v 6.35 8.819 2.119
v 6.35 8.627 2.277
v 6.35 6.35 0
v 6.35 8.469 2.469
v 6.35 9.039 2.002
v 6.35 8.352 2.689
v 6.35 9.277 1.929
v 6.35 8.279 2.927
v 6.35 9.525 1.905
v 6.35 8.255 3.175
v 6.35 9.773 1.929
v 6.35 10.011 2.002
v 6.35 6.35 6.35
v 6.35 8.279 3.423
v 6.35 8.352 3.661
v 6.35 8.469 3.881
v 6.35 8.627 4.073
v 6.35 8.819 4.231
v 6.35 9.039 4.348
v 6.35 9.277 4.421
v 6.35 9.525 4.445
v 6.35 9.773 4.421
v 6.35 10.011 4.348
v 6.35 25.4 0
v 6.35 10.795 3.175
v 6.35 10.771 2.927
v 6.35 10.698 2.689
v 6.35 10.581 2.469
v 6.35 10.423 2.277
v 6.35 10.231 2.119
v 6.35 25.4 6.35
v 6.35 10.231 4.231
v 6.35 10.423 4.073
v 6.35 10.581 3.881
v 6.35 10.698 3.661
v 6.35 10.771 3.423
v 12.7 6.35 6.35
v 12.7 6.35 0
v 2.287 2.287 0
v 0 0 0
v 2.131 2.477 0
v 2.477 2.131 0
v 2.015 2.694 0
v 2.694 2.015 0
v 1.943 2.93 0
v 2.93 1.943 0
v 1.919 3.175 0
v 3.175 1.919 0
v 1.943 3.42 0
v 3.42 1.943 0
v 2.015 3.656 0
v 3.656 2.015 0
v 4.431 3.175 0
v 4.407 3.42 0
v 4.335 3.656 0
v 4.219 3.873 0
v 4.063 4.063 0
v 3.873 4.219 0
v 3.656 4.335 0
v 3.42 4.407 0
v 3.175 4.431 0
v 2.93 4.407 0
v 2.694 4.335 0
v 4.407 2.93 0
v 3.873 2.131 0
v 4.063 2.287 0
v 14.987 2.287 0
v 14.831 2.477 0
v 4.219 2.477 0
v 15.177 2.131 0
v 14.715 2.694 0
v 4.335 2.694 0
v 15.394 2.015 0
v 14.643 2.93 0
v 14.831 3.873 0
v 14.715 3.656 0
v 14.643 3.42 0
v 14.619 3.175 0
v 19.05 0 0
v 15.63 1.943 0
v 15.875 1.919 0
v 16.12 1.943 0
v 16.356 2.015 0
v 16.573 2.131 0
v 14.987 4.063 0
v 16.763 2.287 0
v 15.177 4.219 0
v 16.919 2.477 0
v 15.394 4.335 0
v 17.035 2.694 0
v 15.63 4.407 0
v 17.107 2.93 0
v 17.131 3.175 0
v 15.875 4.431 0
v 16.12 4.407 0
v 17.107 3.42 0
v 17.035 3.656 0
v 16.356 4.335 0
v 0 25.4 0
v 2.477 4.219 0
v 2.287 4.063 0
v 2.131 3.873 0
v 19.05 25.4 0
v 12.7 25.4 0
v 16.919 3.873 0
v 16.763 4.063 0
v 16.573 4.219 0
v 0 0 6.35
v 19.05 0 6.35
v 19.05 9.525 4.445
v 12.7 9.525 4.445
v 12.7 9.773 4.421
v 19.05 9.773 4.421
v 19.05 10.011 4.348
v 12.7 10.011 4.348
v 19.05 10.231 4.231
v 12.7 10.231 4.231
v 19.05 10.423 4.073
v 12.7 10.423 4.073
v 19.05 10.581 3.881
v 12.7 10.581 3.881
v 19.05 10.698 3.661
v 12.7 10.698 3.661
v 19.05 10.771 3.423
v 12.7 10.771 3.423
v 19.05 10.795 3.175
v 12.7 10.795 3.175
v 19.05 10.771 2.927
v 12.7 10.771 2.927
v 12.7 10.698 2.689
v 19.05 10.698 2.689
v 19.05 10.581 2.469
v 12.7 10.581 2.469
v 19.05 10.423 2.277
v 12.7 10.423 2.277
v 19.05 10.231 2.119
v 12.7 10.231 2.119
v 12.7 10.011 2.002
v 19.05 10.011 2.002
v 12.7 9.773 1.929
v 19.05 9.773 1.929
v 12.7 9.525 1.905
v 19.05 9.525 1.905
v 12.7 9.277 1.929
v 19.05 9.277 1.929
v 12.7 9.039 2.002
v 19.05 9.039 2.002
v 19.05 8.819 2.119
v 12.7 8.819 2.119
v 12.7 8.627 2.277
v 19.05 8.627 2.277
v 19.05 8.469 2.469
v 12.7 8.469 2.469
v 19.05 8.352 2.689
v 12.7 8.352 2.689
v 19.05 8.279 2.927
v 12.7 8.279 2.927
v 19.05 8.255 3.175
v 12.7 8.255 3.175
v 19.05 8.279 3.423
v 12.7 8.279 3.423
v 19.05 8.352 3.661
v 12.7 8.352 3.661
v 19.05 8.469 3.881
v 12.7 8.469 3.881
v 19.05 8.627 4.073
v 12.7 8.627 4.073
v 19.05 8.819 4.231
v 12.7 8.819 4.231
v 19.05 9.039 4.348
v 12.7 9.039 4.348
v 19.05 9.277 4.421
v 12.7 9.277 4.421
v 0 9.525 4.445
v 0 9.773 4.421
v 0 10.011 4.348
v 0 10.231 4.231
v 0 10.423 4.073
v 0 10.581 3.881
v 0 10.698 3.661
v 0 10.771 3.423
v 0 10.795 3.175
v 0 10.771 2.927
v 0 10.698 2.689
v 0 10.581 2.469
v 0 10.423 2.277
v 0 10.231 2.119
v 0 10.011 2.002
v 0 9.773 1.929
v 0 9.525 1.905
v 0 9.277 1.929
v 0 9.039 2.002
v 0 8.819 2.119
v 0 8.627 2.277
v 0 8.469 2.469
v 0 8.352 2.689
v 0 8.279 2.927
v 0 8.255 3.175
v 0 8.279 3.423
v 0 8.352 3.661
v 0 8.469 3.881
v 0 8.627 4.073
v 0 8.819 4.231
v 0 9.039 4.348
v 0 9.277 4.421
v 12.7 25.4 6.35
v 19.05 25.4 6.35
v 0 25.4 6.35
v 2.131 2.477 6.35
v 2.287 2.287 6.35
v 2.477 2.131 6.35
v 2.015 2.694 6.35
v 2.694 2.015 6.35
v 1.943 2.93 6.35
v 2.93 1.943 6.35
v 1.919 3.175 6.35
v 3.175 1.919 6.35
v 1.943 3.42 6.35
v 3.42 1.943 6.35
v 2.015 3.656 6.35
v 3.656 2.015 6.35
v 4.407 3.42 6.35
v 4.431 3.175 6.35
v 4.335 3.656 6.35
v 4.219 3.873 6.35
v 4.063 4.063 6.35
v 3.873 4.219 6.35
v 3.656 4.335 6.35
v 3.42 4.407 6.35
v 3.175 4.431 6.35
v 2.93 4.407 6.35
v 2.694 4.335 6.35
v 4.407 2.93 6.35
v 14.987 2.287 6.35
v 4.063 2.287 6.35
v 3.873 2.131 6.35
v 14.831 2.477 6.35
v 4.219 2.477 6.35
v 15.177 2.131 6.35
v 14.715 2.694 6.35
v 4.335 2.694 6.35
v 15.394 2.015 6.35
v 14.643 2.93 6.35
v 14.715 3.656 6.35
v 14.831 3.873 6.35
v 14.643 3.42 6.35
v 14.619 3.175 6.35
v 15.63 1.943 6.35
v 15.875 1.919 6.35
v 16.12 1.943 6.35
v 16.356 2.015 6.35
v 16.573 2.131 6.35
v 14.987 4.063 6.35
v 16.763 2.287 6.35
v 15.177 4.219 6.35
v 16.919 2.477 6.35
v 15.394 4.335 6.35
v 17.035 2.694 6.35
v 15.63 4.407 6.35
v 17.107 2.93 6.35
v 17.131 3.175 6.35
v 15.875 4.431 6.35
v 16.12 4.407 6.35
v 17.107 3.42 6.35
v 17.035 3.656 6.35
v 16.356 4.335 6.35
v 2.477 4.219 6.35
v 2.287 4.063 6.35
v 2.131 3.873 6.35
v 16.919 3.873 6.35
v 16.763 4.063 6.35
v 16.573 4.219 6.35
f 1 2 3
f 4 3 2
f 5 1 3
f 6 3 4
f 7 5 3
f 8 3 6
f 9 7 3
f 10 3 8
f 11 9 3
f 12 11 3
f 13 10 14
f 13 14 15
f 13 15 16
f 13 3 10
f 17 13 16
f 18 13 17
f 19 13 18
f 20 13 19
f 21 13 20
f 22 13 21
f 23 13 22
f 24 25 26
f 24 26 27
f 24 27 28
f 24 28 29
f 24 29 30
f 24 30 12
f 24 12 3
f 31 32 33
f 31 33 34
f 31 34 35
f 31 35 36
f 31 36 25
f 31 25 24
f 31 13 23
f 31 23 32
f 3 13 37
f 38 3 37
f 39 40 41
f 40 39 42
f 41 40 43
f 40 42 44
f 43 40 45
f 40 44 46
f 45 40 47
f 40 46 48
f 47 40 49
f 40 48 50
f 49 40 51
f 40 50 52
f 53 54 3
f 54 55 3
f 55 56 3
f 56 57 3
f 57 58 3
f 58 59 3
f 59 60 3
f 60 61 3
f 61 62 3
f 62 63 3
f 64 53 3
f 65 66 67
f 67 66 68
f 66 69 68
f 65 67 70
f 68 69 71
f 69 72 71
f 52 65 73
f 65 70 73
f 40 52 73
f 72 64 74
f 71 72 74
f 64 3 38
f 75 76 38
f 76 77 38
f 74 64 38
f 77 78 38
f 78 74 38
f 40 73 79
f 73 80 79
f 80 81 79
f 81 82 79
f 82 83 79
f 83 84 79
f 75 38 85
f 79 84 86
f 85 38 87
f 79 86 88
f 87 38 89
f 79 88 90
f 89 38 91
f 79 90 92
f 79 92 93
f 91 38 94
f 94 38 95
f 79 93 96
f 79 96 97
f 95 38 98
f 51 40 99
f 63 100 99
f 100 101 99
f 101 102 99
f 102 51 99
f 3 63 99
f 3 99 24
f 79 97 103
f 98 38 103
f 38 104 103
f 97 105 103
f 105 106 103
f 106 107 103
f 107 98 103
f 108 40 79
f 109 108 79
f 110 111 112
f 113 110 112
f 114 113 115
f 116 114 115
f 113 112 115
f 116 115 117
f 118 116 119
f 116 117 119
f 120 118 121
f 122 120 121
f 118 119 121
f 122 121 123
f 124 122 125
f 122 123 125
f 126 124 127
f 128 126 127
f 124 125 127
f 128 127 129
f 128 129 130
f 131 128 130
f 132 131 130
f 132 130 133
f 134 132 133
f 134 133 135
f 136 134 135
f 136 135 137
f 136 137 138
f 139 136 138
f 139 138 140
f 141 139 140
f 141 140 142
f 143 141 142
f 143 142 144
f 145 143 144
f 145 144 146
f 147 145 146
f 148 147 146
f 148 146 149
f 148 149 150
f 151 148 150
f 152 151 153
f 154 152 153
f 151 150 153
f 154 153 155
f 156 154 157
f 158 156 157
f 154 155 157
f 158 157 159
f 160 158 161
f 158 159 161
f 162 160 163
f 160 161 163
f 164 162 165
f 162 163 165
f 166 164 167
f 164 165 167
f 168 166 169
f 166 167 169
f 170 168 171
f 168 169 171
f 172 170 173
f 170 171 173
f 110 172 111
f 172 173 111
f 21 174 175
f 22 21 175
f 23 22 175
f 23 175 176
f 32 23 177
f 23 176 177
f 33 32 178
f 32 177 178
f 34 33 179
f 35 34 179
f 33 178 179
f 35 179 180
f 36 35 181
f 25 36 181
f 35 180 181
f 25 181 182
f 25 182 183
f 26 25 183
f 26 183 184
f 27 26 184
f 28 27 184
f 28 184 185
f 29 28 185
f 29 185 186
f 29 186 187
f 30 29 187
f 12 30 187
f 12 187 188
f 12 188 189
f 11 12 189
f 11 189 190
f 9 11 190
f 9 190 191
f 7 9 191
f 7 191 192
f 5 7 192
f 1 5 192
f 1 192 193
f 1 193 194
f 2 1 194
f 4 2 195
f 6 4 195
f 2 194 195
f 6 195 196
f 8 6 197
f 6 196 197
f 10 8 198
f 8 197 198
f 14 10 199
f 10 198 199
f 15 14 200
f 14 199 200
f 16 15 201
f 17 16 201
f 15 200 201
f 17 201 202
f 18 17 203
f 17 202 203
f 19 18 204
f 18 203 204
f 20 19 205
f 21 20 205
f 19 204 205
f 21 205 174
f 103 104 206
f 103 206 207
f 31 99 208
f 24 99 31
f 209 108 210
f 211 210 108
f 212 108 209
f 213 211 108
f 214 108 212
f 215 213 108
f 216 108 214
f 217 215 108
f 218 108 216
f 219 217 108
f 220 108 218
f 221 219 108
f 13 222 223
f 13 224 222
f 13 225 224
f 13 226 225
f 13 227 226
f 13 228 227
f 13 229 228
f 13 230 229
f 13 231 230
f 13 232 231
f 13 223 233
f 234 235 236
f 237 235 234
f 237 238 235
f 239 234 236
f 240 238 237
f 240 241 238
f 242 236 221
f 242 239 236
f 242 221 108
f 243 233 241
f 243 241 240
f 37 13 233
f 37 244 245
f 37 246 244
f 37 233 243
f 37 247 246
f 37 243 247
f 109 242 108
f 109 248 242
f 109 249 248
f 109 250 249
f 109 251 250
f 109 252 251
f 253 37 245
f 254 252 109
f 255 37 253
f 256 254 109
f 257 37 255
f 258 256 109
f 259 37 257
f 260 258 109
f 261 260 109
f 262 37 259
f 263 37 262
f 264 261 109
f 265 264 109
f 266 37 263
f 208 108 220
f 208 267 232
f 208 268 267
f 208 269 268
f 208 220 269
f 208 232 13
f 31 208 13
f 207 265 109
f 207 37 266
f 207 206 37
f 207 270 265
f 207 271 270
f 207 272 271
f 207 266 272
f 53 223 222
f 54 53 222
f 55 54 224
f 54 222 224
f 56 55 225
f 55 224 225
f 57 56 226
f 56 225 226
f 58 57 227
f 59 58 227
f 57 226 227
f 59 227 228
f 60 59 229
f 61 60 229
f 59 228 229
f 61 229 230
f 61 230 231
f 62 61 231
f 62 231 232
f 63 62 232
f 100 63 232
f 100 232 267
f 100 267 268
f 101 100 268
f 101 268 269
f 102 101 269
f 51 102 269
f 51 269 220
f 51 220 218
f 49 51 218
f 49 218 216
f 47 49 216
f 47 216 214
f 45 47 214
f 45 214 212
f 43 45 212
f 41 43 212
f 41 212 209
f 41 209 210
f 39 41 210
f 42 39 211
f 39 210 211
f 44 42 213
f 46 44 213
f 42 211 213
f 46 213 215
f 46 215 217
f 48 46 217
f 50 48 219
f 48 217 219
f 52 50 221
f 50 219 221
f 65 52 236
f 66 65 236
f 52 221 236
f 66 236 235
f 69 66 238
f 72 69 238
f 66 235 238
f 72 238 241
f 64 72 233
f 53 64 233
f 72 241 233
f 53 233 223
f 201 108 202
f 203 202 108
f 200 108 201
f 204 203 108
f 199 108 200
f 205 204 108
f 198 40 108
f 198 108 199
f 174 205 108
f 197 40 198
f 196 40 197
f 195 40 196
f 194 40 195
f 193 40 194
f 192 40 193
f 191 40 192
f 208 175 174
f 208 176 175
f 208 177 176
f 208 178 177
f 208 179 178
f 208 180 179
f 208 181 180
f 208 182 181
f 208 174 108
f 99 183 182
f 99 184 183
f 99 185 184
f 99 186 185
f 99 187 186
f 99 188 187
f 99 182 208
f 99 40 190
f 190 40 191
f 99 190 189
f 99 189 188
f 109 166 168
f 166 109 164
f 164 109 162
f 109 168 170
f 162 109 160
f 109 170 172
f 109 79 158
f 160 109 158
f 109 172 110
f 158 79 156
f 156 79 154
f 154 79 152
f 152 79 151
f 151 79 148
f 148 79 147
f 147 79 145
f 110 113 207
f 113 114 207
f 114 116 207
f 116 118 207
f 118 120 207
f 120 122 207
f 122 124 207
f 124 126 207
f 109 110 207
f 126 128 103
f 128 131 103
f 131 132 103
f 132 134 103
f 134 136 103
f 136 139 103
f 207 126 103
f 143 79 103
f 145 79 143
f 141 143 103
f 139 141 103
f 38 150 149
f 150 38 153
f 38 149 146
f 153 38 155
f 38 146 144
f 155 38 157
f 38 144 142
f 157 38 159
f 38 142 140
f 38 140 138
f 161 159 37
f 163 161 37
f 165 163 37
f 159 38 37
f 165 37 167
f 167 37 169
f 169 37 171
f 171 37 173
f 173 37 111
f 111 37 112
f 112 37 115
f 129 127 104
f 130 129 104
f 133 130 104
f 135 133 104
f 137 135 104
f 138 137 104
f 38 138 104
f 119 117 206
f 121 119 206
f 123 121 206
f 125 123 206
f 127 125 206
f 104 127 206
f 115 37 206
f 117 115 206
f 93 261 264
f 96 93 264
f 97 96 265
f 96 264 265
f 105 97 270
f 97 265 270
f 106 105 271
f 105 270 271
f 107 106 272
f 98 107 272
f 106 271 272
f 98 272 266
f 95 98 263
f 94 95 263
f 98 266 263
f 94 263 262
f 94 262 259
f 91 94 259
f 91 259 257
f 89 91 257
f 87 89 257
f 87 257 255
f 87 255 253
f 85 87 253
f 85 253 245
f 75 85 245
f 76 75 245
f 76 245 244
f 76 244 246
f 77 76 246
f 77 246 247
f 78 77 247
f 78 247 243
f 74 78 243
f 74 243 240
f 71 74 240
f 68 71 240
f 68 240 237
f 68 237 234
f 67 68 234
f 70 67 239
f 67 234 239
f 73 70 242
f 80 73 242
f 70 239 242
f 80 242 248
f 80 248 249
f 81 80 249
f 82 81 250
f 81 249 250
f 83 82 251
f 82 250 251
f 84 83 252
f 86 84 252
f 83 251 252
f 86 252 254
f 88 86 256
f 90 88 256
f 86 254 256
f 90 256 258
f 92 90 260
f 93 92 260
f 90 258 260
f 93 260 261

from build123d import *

# Parameters (mm, degrees)
SKETCH1_W        = 19.05
SKETCH1_H        = 25.4
MAIN_BLOCK_DEPTH = 6.35
SKETCH2_W        = 6.35
SKETCH2_H        = 19.05
U_CUT_DEPTH      = 12.7
SKETCH3_R        = 1.25603
BOLT_HOLES_DEPTH = 12.7
SKETCH4_R        = 1.27
PIN_HOLE_DEPTH   = 20.05


with BuildPart() as part:
    # Sketch1 → Main block (new body)
    with BuildSketch(Plane.XY):
        with Locations((9.525, 12.7)):
            Rectangle(SKETCH1_W, SKETCH1_H)
    extrude(amount=MAIN_BLOCK_DEPTH)

    # Sketch2 → U-cut (cut)
    with BuildSketch(Plane.XY.offset(6.35)):
        with Locations((9.525, 15.875)):
            Rectangle(SKETCH2_W, SKETCH2_H)
    extrude(amount=-U_CUT_DEPTH, mode=Mode.SUBTRACT)

    # Sketch3 → Bolt holes (cut)
    with BuildSketch(Plane.XY.offset(6.35)):
        with Locations((3.175, 3.175)):
            Circle(SKETCH3_R)
        with Locations((15.875, 3.175)):
            Circle(SKETCH3_R)
    extrude(amount=-BOLT_HOLES_DEPTH, mode=Mode.SUBTRACT)

    # Sketch4 → Pin hole (cut, through all)
    with BuildSketch(Plane.ZY):
        with Locations((3.175, 9.525)):
            Circle(SKETCH4_R)
    extrude(amount=-PIN_HOLE_DEPTH, mode=Mode.SUBTRACT)


solid = part.part
